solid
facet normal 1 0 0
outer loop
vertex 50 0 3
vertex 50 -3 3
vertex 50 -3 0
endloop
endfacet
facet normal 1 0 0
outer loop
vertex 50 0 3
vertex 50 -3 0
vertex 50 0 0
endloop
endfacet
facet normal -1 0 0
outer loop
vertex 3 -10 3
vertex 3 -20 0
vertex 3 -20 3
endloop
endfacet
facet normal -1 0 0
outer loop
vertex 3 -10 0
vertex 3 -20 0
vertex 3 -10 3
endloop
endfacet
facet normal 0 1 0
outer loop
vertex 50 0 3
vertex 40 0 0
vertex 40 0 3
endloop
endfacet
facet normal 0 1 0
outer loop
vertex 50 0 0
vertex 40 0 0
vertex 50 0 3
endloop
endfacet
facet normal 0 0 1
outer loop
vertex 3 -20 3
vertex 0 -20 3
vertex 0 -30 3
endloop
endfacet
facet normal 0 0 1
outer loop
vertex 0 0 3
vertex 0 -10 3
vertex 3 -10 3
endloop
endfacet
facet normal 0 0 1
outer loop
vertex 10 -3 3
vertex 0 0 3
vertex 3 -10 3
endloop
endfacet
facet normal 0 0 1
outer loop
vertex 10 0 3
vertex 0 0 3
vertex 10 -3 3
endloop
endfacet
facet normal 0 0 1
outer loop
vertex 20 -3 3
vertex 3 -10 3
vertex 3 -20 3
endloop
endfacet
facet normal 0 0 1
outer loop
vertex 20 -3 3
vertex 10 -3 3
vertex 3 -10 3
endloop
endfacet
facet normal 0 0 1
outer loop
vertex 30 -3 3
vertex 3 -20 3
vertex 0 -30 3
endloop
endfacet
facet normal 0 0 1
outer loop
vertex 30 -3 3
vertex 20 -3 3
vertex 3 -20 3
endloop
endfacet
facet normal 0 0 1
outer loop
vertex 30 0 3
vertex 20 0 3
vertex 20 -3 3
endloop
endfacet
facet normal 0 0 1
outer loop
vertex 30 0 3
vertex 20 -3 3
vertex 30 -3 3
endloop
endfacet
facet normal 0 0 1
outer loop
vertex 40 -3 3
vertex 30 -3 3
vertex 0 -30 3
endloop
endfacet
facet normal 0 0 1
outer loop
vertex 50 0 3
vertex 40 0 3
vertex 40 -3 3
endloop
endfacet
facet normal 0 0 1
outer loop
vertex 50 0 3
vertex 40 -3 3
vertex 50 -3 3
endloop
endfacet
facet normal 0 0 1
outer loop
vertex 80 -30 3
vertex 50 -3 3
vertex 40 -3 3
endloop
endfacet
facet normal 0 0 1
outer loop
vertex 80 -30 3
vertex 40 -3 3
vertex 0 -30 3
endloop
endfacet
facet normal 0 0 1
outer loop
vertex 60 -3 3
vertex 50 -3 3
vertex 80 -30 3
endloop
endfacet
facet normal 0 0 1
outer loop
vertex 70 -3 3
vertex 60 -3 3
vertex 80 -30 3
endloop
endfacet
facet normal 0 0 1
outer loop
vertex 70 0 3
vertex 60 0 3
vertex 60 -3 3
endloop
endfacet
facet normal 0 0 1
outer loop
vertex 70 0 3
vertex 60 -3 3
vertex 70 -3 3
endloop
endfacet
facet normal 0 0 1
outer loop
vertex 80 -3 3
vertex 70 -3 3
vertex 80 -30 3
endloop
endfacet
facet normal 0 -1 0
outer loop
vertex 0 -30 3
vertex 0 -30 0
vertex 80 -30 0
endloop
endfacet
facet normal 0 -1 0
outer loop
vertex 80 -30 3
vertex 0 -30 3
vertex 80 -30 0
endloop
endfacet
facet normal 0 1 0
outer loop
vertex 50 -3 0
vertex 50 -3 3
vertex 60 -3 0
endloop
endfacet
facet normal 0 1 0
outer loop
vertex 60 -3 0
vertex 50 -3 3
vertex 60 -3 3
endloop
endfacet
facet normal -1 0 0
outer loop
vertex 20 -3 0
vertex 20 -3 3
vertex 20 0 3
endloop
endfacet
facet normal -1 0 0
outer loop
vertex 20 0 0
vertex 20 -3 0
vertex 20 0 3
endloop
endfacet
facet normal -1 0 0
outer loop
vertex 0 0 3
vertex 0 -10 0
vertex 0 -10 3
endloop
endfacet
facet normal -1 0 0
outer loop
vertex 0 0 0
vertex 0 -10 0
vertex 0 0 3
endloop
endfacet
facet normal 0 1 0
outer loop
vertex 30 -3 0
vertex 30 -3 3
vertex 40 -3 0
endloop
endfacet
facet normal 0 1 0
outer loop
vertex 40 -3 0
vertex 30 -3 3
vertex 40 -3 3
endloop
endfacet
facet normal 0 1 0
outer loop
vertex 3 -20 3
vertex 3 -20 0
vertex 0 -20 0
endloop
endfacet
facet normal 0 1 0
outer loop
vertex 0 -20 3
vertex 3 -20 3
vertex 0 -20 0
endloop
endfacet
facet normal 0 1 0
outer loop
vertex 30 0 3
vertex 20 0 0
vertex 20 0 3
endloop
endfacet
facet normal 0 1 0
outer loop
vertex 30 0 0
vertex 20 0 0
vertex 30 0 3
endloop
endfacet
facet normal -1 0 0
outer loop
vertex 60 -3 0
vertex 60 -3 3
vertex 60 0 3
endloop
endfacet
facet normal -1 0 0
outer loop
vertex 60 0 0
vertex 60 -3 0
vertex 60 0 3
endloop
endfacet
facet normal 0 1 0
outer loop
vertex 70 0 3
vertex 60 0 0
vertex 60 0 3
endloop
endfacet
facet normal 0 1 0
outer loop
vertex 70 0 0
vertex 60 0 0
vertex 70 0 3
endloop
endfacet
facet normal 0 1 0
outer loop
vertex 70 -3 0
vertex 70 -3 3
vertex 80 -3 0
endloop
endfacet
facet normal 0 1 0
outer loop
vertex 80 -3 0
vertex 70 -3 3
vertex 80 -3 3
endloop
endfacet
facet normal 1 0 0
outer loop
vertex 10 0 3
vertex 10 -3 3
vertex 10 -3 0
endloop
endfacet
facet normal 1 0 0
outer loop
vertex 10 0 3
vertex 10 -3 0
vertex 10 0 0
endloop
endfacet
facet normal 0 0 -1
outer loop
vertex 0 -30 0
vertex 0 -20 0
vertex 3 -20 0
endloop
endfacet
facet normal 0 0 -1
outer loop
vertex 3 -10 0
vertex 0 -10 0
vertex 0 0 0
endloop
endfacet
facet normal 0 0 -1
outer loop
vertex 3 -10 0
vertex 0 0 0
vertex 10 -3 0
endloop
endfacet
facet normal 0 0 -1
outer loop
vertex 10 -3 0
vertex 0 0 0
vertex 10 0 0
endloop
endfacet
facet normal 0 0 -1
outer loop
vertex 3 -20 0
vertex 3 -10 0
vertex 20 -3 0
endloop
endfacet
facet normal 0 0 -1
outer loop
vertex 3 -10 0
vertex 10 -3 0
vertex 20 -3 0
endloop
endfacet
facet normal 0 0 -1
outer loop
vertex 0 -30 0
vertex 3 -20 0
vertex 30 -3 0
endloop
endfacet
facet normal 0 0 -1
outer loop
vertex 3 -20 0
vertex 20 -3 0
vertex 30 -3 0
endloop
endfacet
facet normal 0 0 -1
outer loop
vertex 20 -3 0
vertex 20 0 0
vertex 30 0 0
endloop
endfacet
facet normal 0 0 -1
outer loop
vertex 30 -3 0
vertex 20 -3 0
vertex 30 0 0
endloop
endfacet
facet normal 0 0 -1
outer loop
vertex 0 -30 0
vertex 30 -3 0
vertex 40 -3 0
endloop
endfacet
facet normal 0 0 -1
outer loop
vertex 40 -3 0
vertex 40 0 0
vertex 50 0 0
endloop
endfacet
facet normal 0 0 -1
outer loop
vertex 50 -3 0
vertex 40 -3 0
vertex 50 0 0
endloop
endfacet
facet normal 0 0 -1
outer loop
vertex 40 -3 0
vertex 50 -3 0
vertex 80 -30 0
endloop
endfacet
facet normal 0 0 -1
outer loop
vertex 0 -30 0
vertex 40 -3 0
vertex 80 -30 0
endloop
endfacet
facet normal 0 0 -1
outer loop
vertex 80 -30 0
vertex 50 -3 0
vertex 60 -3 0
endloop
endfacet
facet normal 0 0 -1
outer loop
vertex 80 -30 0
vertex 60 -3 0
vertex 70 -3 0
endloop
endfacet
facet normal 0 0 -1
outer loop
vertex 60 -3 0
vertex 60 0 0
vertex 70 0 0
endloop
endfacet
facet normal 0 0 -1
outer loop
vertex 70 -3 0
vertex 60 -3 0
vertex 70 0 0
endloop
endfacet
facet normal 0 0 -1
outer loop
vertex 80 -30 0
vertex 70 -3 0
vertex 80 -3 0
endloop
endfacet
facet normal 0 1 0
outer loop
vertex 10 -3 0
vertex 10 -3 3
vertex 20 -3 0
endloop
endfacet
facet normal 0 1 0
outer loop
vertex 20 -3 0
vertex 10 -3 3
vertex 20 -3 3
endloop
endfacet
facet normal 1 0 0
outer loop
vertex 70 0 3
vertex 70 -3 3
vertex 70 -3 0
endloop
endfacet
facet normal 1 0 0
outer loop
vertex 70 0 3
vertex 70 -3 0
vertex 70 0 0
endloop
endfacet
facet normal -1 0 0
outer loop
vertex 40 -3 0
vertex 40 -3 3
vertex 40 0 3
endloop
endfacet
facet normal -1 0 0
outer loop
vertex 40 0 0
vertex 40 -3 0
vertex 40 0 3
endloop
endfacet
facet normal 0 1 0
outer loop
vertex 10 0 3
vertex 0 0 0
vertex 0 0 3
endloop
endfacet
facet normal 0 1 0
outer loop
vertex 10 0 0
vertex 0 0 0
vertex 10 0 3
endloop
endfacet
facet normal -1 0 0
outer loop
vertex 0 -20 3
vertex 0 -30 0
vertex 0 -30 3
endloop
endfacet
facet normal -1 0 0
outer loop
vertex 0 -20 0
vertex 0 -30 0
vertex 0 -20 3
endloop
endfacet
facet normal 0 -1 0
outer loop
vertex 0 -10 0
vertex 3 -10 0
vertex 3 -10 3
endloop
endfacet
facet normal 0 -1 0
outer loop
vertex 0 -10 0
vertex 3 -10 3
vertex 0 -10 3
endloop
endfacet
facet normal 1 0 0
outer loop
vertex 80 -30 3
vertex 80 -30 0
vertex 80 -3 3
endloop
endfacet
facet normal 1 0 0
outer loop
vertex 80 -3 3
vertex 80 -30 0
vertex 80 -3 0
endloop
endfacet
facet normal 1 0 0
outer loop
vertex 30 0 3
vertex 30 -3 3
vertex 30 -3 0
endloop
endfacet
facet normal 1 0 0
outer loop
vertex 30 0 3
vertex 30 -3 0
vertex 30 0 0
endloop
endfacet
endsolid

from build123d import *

# Parameters (mm, degrees)
ESQUISSE1_W                = 80
ESQUISSE1_H                = 30
BOSS_EXTRU_1_DEPTH         = 3
ESQUISSE2_W                = 10
ESQUISSE2_H                = 3
ENL_V_MAT_EXTRU_1_DEPTH    = 3
R_P_TITION_LIN_AIRE1_COUNT = 4
R_P_TITION_LIN_AIRE1_PITCH = 20
ESQUISSE3_W                = 3
ESQUISSE3_H                = 10
ENL_V_MAT_EXTRU_2_DEPTH    = 3


with BuildPart() as part:
    # Esquisse1 → Boss.-Extru.1 (new body)
    with BuildSketch(Plane.XY):
        with Locations((40, -15)):
            Rectangle(ESQUISSE1_W, ESQUISSE1_H)
    extrude(amount=BOSS_EXTRU_1_DEPTH)

    # Esquisse2 → Enlèv. mat.-Extru.1 (cut)
    with BuildSketch(Plane.XY.offset(3)):
        with Locations((75, -1.5)):
            Rectangle(ESQUISSE2_W, ESQUISSE2_H)
    enl_v_mat_extru_1 = extrude(amount=-ENL_V_MAT_EXTRU_1_DEPTH, mode=Mode.SUBTRACT)

    # Répétition linéaire1: Enlèv. mat.-Extru.1 ×4
    with Locations(*[(-i * R_P_TITION_LIN_AIRE1_PITCH, 0, 0) for i in range(1, R_P_TITION_LIN_AIRE1_COUNT)]):
        add(enl_v_mat_extru_1, mode=Mode.SUBTRACT)

    # Esquisse3 → Enlèv. mat.-Extru.2 (cut)
    with BuildSketch(Plane(origin=(0, 0, 0), x_dir=(-1, 0, 0), z_dir=(0, 0, -1))):
        with Locations((-1.5, -15)):
            Rectangle(ESQUISSE3_W, ESQUISSE3_H)
    extrude(amount=-ENL_V_MAT_EXTRU_2_DEPTH, mode=Mode.SUBTRACT)


solid = part.part
